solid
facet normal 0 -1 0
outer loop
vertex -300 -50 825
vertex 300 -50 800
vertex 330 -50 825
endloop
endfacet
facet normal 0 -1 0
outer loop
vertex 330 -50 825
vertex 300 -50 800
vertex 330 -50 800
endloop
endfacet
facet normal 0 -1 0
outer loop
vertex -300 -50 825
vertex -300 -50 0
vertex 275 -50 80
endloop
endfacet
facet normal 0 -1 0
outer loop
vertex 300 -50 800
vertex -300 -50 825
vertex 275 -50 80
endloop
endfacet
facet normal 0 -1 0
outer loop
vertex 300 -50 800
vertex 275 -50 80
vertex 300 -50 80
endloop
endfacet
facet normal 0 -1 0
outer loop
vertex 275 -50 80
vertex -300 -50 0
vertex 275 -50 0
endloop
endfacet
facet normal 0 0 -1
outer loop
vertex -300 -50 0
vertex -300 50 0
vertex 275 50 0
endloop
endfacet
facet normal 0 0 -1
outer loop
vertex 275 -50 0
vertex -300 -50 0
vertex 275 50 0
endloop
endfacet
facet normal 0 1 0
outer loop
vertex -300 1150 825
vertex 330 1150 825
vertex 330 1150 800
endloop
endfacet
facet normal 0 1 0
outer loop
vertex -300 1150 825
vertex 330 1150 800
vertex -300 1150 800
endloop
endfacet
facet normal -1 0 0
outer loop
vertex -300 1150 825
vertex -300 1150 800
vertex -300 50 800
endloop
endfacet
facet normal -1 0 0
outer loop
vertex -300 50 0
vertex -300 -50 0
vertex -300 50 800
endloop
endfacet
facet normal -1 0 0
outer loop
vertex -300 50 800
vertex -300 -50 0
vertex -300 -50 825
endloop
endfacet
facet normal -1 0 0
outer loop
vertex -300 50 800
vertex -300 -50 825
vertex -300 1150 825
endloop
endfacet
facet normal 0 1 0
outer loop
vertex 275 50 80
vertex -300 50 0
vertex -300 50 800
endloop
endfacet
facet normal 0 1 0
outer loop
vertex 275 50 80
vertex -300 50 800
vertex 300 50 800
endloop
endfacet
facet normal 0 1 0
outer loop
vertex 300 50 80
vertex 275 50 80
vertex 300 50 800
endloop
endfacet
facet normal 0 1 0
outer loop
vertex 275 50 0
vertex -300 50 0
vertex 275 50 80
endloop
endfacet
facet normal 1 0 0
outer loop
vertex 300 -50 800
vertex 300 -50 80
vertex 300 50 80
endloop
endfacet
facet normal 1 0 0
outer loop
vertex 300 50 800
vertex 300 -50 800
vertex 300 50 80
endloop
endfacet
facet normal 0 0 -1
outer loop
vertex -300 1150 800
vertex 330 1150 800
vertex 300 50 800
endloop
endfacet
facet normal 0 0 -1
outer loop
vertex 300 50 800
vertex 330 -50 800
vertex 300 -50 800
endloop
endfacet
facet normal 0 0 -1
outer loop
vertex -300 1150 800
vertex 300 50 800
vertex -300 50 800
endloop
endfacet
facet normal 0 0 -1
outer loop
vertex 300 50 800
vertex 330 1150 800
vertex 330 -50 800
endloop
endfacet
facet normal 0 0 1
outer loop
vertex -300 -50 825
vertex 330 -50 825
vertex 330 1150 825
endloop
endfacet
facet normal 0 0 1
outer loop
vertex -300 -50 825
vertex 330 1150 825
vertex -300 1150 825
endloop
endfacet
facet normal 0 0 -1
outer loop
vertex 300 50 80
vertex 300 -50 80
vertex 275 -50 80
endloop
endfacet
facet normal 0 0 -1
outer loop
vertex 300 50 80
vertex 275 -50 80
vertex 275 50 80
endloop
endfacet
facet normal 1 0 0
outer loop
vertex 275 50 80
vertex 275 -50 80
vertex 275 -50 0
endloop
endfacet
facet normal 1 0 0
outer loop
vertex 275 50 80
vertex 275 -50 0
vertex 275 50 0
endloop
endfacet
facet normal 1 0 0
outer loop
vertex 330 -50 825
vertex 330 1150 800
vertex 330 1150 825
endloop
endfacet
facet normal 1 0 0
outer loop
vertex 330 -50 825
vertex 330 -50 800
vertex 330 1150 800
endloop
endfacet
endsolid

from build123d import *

# Parameters (mm, degrees)
F0_W     = 600
F0_H     = 100
F1_DEPTH = 800
F2_W     = 100
F2_H     = 80
F3_DEPTH = 25
F4_W     = 630
F4_H     = 100
F5_DEPTH = 25
F6_W     = 630
F6_H     = 25
F7_DEPTH = 1100


with BuildPart() as f1:
    # F0 (on Top) → F1 (new body)
    with BuildSketch(Plane.XY):
        Rectangle(F0_W, F0_H)
    extrude(amount=F1_DEPTH)

    # F2 (on face) → F3 (cut)
    with BuildSketch(Plane.YZ.offset(300)):
        with Locations((0, 40)):
            Rectangle(F2_W, F2_H)
    extrude(amount=-F3_DEPTH, mode=Mode.SUBTRACT)

    # F4 (on face) → F5 (join)
    with BuildSketch(Plane.XY.offset(800)):
        with Locations((15, 0)):
            Rectangle(F4_W, F4_H)
    extrude(amount=F5_DEPTH)

    # F6 (on face) → F7 (join)
    with BuildSketch(Plane(origin=(0, 50, 0), x_dir=(-1, 0, 0), z_dir=(0, 1, 0))):
        with Locations((-15, 812.5)):
            Rectangle(F6_W, F6_H)
    extrude(amount=F7_DEPTH)


solid = f1.part
